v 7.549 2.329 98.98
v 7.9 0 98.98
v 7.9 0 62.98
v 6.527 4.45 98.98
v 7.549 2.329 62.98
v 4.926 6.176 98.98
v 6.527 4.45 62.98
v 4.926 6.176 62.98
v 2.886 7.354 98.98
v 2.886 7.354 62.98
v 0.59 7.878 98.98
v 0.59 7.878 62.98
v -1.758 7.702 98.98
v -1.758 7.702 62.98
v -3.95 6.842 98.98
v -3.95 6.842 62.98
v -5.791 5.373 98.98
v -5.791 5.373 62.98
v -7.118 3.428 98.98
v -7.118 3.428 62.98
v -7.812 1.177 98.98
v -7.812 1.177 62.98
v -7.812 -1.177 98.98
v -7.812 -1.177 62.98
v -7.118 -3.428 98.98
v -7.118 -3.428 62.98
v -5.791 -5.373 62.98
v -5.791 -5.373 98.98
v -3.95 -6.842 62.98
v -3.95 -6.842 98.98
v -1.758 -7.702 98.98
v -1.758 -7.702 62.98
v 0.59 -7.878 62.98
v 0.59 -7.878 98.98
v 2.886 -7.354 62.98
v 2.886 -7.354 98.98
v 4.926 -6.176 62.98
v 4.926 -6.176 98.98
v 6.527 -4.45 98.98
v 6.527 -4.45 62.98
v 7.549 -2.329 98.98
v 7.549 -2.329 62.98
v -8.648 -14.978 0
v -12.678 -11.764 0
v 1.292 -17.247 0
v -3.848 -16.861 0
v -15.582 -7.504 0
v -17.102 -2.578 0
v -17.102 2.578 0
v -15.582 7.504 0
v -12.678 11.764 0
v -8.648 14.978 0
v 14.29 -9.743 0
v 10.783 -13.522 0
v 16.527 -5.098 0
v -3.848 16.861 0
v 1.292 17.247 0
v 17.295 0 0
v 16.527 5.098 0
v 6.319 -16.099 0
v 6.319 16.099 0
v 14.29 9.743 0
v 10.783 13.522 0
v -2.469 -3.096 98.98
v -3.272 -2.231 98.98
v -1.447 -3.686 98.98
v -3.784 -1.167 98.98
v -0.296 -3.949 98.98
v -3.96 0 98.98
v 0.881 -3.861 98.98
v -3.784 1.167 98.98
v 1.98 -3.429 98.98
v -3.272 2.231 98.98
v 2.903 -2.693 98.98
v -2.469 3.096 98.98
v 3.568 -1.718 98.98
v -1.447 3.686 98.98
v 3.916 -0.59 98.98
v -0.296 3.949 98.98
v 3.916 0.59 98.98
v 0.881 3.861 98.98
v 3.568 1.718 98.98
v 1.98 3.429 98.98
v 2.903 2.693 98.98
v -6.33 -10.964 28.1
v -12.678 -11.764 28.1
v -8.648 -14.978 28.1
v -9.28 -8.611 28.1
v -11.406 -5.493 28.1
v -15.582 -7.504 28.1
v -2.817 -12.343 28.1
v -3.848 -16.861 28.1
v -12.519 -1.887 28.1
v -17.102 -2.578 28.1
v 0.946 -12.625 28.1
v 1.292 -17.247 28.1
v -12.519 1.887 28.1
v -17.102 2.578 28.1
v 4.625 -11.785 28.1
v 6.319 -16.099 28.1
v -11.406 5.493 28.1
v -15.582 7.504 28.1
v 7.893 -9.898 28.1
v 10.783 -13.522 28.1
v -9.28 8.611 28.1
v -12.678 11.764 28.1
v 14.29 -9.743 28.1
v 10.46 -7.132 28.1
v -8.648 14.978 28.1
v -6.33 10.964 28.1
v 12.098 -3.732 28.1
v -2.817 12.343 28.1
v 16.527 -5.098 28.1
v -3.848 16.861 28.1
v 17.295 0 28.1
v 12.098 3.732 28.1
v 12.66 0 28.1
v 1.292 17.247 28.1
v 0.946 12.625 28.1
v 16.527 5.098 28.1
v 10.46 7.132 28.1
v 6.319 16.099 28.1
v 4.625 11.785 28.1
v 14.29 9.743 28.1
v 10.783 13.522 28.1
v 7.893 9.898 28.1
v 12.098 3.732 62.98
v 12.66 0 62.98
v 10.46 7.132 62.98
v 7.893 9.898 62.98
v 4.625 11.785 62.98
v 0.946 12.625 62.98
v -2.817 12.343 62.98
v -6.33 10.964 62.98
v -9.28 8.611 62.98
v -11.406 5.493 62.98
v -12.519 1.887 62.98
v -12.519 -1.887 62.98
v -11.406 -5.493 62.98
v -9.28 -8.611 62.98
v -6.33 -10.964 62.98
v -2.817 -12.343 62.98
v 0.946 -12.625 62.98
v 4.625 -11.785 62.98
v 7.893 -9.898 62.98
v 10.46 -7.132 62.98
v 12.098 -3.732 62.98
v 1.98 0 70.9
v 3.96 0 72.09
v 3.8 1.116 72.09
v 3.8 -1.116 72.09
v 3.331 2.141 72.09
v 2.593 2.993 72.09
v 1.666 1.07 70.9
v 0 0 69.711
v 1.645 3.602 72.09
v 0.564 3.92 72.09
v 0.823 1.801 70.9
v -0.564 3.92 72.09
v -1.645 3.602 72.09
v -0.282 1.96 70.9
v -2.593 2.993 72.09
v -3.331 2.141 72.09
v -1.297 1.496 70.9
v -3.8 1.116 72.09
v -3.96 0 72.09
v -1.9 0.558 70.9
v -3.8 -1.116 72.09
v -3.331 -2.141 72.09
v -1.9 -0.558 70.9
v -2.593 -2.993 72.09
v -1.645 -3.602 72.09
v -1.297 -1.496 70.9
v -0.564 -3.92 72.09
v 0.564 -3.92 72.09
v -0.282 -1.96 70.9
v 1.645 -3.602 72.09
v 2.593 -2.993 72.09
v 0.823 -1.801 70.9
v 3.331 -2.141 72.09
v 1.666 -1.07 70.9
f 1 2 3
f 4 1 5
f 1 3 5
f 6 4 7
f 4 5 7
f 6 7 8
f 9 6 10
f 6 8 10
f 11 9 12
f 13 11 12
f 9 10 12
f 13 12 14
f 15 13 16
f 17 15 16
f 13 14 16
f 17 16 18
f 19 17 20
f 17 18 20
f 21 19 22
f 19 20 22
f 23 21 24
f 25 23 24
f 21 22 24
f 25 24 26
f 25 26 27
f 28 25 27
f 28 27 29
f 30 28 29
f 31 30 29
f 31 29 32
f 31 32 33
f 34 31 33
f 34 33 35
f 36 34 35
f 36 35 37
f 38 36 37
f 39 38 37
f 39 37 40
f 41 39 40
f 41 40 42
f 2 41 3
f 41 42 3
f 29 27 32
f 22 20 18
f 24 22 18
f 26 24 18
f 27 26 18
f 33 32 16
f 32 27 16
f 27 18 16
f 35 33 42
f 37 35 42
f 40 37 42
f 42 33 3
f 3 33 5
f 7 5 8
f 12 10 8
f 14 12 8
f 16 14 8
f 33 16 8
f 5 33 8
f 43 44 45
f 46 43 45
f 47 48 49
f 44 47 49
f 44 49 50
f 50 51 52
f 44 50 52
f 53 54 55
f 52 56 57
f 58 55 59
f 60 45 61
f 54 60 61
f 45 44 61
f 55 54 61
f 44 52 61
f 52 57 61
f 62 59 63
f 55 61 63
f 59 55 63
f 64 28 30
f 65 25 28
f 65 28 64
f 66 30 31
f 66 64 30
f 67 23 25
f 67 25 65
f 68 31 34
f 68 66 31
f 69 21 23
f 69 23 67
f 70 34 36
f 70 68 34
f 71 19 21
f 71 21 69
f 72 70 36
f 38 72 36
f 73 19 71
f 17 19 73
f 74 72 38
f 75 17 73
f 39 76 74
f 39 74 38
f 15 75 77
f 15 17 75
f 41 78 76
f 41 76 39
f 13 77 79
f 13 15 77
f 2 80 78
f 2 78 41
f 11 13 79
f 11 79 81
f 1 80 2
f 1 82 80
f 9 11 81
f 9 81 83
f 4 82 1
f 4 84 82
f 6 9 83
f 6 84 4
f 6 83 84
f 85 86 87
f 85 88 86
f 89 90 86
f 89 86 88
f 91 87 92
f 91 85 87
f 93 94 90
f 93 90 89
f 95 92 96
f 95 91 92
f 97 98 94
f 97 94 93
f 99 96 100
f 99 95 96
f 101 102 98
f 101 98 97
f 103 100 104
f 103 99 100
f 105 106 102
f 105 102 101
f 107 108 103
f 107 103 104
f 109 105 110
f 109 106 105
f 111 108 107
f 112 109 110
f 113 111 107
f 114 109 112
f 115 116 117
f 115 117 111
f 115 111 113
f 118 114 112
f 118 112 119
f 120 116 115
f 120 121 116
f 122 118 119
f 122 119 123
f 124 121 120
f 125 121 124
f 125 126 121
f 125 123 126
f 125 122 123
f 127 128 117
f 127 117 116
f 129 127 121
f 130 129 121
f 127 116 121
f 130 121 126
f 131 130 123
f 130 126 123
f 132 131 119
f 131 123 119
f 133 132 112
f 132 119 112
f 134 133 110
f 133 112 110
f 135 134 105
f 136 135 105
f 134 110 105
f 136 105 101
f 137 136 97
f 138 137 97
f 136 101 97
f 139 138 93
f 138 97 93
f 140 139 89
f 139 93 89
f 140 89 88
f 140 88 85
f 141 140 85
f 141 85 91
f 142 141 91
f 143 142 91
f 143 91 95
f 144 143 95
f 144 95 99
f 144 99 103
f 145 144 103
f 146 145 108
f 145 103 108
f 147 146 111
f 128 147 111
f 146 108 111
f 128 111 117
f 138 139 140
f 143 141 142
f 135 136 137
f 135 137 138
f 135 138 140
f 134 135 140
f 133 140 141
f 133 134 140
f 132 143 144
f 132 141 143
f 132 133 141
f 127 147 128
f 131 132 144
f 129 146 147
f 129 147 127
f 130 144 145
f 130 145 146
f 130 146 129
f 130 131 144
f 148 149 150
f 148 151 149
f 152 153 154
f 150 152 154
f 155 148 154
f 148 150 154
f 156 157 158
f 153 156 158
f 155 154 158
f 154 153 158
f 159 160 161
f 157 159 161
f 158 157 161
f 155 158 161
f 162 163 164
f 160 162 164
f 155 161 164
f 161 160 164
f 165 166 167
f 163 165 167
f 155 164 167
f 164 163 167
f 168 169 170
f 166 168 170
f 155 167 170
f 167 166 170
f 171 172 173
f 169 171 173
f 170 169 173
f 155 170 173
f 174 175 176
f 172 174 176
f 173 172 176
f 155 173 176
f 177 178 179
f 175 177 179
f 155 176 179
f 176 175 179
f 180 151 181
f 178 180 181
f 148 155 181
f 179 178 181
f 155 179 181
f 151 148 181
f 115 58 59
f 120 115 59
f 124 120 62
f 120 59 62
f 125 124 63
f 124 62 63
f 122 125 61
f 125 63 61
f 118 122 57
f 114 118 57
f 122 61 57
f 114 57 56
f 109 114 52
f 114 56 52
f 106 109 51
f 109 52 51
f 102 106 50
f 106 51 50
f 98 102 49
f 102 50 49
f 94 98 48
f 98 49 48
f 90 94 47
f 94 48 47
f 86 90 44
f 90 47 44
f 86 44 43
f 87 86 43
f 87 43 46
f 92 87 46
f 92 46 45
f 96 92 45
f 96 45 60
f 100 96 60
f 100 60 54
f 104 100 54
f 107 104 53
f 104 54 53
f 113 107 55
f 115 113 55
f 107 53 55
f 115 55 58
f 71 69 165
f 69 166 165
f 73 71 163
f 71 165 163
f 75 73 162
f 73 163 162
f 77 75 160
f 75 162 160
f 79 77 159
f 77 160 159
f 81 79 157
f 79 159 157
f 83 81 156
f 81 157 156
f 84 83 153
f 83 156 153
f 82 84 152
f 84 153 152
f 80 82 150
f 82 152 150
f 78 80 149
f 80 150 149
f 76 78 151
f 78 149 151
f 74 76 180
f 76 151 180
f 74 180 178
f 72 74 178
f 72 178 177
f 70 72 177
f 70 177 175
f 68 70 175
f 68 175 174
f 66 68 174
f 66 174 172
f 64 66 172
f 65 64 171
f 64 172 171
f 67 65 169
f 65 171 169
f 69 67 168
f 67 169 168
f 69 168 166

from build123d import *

# Parameters (mm, degrees)
F0_R     = 17.295
F1_DEPTH = 28.1
F2_R     = 12.66
F3_DEPTH = 34.88
F4_R     = 7.9
F5_DEPTH = 36
F7_D     = 7.92
F7_DEPTH = 26.89
F7_TIP   = 2.3794080513


with BuildPart() as f1:
    # F0 (on Top) → F1 (new body)
    with BuildSketch(Plane.XY):
        Circle(F0_R)
    extrude(amount=F1_DEPTH)

    # F2 (on face) → F3 (join)
    with BuildSketch(Plane.XY.offset(28.1)):
        Circle(F2_R)
    extrude(amount=F3_DEPTH)


with BuildPart() as f5:
    # F4 (on face) → F5 (new body)
    with BuildSketch(Plane.XY.offset(62.98)):
        Circle(F4_R)
    extrude(amount=F5_DEPTH)

    # F7
    with Locations(Plane.XY.offset(98.98)):
        with Locations((0, 0)):
            Hole(F7_D / 2, depth=F7_DEPTH)
            with Locations((0, 0, -(F7_DEPTH + F7_TIP / 2))):  # 118° drill point
                Cone(0, F7_D / 2, F7_TIP, mode=Mode.SUBTRACT)


solid = Compound([f1.part, f5.part])
